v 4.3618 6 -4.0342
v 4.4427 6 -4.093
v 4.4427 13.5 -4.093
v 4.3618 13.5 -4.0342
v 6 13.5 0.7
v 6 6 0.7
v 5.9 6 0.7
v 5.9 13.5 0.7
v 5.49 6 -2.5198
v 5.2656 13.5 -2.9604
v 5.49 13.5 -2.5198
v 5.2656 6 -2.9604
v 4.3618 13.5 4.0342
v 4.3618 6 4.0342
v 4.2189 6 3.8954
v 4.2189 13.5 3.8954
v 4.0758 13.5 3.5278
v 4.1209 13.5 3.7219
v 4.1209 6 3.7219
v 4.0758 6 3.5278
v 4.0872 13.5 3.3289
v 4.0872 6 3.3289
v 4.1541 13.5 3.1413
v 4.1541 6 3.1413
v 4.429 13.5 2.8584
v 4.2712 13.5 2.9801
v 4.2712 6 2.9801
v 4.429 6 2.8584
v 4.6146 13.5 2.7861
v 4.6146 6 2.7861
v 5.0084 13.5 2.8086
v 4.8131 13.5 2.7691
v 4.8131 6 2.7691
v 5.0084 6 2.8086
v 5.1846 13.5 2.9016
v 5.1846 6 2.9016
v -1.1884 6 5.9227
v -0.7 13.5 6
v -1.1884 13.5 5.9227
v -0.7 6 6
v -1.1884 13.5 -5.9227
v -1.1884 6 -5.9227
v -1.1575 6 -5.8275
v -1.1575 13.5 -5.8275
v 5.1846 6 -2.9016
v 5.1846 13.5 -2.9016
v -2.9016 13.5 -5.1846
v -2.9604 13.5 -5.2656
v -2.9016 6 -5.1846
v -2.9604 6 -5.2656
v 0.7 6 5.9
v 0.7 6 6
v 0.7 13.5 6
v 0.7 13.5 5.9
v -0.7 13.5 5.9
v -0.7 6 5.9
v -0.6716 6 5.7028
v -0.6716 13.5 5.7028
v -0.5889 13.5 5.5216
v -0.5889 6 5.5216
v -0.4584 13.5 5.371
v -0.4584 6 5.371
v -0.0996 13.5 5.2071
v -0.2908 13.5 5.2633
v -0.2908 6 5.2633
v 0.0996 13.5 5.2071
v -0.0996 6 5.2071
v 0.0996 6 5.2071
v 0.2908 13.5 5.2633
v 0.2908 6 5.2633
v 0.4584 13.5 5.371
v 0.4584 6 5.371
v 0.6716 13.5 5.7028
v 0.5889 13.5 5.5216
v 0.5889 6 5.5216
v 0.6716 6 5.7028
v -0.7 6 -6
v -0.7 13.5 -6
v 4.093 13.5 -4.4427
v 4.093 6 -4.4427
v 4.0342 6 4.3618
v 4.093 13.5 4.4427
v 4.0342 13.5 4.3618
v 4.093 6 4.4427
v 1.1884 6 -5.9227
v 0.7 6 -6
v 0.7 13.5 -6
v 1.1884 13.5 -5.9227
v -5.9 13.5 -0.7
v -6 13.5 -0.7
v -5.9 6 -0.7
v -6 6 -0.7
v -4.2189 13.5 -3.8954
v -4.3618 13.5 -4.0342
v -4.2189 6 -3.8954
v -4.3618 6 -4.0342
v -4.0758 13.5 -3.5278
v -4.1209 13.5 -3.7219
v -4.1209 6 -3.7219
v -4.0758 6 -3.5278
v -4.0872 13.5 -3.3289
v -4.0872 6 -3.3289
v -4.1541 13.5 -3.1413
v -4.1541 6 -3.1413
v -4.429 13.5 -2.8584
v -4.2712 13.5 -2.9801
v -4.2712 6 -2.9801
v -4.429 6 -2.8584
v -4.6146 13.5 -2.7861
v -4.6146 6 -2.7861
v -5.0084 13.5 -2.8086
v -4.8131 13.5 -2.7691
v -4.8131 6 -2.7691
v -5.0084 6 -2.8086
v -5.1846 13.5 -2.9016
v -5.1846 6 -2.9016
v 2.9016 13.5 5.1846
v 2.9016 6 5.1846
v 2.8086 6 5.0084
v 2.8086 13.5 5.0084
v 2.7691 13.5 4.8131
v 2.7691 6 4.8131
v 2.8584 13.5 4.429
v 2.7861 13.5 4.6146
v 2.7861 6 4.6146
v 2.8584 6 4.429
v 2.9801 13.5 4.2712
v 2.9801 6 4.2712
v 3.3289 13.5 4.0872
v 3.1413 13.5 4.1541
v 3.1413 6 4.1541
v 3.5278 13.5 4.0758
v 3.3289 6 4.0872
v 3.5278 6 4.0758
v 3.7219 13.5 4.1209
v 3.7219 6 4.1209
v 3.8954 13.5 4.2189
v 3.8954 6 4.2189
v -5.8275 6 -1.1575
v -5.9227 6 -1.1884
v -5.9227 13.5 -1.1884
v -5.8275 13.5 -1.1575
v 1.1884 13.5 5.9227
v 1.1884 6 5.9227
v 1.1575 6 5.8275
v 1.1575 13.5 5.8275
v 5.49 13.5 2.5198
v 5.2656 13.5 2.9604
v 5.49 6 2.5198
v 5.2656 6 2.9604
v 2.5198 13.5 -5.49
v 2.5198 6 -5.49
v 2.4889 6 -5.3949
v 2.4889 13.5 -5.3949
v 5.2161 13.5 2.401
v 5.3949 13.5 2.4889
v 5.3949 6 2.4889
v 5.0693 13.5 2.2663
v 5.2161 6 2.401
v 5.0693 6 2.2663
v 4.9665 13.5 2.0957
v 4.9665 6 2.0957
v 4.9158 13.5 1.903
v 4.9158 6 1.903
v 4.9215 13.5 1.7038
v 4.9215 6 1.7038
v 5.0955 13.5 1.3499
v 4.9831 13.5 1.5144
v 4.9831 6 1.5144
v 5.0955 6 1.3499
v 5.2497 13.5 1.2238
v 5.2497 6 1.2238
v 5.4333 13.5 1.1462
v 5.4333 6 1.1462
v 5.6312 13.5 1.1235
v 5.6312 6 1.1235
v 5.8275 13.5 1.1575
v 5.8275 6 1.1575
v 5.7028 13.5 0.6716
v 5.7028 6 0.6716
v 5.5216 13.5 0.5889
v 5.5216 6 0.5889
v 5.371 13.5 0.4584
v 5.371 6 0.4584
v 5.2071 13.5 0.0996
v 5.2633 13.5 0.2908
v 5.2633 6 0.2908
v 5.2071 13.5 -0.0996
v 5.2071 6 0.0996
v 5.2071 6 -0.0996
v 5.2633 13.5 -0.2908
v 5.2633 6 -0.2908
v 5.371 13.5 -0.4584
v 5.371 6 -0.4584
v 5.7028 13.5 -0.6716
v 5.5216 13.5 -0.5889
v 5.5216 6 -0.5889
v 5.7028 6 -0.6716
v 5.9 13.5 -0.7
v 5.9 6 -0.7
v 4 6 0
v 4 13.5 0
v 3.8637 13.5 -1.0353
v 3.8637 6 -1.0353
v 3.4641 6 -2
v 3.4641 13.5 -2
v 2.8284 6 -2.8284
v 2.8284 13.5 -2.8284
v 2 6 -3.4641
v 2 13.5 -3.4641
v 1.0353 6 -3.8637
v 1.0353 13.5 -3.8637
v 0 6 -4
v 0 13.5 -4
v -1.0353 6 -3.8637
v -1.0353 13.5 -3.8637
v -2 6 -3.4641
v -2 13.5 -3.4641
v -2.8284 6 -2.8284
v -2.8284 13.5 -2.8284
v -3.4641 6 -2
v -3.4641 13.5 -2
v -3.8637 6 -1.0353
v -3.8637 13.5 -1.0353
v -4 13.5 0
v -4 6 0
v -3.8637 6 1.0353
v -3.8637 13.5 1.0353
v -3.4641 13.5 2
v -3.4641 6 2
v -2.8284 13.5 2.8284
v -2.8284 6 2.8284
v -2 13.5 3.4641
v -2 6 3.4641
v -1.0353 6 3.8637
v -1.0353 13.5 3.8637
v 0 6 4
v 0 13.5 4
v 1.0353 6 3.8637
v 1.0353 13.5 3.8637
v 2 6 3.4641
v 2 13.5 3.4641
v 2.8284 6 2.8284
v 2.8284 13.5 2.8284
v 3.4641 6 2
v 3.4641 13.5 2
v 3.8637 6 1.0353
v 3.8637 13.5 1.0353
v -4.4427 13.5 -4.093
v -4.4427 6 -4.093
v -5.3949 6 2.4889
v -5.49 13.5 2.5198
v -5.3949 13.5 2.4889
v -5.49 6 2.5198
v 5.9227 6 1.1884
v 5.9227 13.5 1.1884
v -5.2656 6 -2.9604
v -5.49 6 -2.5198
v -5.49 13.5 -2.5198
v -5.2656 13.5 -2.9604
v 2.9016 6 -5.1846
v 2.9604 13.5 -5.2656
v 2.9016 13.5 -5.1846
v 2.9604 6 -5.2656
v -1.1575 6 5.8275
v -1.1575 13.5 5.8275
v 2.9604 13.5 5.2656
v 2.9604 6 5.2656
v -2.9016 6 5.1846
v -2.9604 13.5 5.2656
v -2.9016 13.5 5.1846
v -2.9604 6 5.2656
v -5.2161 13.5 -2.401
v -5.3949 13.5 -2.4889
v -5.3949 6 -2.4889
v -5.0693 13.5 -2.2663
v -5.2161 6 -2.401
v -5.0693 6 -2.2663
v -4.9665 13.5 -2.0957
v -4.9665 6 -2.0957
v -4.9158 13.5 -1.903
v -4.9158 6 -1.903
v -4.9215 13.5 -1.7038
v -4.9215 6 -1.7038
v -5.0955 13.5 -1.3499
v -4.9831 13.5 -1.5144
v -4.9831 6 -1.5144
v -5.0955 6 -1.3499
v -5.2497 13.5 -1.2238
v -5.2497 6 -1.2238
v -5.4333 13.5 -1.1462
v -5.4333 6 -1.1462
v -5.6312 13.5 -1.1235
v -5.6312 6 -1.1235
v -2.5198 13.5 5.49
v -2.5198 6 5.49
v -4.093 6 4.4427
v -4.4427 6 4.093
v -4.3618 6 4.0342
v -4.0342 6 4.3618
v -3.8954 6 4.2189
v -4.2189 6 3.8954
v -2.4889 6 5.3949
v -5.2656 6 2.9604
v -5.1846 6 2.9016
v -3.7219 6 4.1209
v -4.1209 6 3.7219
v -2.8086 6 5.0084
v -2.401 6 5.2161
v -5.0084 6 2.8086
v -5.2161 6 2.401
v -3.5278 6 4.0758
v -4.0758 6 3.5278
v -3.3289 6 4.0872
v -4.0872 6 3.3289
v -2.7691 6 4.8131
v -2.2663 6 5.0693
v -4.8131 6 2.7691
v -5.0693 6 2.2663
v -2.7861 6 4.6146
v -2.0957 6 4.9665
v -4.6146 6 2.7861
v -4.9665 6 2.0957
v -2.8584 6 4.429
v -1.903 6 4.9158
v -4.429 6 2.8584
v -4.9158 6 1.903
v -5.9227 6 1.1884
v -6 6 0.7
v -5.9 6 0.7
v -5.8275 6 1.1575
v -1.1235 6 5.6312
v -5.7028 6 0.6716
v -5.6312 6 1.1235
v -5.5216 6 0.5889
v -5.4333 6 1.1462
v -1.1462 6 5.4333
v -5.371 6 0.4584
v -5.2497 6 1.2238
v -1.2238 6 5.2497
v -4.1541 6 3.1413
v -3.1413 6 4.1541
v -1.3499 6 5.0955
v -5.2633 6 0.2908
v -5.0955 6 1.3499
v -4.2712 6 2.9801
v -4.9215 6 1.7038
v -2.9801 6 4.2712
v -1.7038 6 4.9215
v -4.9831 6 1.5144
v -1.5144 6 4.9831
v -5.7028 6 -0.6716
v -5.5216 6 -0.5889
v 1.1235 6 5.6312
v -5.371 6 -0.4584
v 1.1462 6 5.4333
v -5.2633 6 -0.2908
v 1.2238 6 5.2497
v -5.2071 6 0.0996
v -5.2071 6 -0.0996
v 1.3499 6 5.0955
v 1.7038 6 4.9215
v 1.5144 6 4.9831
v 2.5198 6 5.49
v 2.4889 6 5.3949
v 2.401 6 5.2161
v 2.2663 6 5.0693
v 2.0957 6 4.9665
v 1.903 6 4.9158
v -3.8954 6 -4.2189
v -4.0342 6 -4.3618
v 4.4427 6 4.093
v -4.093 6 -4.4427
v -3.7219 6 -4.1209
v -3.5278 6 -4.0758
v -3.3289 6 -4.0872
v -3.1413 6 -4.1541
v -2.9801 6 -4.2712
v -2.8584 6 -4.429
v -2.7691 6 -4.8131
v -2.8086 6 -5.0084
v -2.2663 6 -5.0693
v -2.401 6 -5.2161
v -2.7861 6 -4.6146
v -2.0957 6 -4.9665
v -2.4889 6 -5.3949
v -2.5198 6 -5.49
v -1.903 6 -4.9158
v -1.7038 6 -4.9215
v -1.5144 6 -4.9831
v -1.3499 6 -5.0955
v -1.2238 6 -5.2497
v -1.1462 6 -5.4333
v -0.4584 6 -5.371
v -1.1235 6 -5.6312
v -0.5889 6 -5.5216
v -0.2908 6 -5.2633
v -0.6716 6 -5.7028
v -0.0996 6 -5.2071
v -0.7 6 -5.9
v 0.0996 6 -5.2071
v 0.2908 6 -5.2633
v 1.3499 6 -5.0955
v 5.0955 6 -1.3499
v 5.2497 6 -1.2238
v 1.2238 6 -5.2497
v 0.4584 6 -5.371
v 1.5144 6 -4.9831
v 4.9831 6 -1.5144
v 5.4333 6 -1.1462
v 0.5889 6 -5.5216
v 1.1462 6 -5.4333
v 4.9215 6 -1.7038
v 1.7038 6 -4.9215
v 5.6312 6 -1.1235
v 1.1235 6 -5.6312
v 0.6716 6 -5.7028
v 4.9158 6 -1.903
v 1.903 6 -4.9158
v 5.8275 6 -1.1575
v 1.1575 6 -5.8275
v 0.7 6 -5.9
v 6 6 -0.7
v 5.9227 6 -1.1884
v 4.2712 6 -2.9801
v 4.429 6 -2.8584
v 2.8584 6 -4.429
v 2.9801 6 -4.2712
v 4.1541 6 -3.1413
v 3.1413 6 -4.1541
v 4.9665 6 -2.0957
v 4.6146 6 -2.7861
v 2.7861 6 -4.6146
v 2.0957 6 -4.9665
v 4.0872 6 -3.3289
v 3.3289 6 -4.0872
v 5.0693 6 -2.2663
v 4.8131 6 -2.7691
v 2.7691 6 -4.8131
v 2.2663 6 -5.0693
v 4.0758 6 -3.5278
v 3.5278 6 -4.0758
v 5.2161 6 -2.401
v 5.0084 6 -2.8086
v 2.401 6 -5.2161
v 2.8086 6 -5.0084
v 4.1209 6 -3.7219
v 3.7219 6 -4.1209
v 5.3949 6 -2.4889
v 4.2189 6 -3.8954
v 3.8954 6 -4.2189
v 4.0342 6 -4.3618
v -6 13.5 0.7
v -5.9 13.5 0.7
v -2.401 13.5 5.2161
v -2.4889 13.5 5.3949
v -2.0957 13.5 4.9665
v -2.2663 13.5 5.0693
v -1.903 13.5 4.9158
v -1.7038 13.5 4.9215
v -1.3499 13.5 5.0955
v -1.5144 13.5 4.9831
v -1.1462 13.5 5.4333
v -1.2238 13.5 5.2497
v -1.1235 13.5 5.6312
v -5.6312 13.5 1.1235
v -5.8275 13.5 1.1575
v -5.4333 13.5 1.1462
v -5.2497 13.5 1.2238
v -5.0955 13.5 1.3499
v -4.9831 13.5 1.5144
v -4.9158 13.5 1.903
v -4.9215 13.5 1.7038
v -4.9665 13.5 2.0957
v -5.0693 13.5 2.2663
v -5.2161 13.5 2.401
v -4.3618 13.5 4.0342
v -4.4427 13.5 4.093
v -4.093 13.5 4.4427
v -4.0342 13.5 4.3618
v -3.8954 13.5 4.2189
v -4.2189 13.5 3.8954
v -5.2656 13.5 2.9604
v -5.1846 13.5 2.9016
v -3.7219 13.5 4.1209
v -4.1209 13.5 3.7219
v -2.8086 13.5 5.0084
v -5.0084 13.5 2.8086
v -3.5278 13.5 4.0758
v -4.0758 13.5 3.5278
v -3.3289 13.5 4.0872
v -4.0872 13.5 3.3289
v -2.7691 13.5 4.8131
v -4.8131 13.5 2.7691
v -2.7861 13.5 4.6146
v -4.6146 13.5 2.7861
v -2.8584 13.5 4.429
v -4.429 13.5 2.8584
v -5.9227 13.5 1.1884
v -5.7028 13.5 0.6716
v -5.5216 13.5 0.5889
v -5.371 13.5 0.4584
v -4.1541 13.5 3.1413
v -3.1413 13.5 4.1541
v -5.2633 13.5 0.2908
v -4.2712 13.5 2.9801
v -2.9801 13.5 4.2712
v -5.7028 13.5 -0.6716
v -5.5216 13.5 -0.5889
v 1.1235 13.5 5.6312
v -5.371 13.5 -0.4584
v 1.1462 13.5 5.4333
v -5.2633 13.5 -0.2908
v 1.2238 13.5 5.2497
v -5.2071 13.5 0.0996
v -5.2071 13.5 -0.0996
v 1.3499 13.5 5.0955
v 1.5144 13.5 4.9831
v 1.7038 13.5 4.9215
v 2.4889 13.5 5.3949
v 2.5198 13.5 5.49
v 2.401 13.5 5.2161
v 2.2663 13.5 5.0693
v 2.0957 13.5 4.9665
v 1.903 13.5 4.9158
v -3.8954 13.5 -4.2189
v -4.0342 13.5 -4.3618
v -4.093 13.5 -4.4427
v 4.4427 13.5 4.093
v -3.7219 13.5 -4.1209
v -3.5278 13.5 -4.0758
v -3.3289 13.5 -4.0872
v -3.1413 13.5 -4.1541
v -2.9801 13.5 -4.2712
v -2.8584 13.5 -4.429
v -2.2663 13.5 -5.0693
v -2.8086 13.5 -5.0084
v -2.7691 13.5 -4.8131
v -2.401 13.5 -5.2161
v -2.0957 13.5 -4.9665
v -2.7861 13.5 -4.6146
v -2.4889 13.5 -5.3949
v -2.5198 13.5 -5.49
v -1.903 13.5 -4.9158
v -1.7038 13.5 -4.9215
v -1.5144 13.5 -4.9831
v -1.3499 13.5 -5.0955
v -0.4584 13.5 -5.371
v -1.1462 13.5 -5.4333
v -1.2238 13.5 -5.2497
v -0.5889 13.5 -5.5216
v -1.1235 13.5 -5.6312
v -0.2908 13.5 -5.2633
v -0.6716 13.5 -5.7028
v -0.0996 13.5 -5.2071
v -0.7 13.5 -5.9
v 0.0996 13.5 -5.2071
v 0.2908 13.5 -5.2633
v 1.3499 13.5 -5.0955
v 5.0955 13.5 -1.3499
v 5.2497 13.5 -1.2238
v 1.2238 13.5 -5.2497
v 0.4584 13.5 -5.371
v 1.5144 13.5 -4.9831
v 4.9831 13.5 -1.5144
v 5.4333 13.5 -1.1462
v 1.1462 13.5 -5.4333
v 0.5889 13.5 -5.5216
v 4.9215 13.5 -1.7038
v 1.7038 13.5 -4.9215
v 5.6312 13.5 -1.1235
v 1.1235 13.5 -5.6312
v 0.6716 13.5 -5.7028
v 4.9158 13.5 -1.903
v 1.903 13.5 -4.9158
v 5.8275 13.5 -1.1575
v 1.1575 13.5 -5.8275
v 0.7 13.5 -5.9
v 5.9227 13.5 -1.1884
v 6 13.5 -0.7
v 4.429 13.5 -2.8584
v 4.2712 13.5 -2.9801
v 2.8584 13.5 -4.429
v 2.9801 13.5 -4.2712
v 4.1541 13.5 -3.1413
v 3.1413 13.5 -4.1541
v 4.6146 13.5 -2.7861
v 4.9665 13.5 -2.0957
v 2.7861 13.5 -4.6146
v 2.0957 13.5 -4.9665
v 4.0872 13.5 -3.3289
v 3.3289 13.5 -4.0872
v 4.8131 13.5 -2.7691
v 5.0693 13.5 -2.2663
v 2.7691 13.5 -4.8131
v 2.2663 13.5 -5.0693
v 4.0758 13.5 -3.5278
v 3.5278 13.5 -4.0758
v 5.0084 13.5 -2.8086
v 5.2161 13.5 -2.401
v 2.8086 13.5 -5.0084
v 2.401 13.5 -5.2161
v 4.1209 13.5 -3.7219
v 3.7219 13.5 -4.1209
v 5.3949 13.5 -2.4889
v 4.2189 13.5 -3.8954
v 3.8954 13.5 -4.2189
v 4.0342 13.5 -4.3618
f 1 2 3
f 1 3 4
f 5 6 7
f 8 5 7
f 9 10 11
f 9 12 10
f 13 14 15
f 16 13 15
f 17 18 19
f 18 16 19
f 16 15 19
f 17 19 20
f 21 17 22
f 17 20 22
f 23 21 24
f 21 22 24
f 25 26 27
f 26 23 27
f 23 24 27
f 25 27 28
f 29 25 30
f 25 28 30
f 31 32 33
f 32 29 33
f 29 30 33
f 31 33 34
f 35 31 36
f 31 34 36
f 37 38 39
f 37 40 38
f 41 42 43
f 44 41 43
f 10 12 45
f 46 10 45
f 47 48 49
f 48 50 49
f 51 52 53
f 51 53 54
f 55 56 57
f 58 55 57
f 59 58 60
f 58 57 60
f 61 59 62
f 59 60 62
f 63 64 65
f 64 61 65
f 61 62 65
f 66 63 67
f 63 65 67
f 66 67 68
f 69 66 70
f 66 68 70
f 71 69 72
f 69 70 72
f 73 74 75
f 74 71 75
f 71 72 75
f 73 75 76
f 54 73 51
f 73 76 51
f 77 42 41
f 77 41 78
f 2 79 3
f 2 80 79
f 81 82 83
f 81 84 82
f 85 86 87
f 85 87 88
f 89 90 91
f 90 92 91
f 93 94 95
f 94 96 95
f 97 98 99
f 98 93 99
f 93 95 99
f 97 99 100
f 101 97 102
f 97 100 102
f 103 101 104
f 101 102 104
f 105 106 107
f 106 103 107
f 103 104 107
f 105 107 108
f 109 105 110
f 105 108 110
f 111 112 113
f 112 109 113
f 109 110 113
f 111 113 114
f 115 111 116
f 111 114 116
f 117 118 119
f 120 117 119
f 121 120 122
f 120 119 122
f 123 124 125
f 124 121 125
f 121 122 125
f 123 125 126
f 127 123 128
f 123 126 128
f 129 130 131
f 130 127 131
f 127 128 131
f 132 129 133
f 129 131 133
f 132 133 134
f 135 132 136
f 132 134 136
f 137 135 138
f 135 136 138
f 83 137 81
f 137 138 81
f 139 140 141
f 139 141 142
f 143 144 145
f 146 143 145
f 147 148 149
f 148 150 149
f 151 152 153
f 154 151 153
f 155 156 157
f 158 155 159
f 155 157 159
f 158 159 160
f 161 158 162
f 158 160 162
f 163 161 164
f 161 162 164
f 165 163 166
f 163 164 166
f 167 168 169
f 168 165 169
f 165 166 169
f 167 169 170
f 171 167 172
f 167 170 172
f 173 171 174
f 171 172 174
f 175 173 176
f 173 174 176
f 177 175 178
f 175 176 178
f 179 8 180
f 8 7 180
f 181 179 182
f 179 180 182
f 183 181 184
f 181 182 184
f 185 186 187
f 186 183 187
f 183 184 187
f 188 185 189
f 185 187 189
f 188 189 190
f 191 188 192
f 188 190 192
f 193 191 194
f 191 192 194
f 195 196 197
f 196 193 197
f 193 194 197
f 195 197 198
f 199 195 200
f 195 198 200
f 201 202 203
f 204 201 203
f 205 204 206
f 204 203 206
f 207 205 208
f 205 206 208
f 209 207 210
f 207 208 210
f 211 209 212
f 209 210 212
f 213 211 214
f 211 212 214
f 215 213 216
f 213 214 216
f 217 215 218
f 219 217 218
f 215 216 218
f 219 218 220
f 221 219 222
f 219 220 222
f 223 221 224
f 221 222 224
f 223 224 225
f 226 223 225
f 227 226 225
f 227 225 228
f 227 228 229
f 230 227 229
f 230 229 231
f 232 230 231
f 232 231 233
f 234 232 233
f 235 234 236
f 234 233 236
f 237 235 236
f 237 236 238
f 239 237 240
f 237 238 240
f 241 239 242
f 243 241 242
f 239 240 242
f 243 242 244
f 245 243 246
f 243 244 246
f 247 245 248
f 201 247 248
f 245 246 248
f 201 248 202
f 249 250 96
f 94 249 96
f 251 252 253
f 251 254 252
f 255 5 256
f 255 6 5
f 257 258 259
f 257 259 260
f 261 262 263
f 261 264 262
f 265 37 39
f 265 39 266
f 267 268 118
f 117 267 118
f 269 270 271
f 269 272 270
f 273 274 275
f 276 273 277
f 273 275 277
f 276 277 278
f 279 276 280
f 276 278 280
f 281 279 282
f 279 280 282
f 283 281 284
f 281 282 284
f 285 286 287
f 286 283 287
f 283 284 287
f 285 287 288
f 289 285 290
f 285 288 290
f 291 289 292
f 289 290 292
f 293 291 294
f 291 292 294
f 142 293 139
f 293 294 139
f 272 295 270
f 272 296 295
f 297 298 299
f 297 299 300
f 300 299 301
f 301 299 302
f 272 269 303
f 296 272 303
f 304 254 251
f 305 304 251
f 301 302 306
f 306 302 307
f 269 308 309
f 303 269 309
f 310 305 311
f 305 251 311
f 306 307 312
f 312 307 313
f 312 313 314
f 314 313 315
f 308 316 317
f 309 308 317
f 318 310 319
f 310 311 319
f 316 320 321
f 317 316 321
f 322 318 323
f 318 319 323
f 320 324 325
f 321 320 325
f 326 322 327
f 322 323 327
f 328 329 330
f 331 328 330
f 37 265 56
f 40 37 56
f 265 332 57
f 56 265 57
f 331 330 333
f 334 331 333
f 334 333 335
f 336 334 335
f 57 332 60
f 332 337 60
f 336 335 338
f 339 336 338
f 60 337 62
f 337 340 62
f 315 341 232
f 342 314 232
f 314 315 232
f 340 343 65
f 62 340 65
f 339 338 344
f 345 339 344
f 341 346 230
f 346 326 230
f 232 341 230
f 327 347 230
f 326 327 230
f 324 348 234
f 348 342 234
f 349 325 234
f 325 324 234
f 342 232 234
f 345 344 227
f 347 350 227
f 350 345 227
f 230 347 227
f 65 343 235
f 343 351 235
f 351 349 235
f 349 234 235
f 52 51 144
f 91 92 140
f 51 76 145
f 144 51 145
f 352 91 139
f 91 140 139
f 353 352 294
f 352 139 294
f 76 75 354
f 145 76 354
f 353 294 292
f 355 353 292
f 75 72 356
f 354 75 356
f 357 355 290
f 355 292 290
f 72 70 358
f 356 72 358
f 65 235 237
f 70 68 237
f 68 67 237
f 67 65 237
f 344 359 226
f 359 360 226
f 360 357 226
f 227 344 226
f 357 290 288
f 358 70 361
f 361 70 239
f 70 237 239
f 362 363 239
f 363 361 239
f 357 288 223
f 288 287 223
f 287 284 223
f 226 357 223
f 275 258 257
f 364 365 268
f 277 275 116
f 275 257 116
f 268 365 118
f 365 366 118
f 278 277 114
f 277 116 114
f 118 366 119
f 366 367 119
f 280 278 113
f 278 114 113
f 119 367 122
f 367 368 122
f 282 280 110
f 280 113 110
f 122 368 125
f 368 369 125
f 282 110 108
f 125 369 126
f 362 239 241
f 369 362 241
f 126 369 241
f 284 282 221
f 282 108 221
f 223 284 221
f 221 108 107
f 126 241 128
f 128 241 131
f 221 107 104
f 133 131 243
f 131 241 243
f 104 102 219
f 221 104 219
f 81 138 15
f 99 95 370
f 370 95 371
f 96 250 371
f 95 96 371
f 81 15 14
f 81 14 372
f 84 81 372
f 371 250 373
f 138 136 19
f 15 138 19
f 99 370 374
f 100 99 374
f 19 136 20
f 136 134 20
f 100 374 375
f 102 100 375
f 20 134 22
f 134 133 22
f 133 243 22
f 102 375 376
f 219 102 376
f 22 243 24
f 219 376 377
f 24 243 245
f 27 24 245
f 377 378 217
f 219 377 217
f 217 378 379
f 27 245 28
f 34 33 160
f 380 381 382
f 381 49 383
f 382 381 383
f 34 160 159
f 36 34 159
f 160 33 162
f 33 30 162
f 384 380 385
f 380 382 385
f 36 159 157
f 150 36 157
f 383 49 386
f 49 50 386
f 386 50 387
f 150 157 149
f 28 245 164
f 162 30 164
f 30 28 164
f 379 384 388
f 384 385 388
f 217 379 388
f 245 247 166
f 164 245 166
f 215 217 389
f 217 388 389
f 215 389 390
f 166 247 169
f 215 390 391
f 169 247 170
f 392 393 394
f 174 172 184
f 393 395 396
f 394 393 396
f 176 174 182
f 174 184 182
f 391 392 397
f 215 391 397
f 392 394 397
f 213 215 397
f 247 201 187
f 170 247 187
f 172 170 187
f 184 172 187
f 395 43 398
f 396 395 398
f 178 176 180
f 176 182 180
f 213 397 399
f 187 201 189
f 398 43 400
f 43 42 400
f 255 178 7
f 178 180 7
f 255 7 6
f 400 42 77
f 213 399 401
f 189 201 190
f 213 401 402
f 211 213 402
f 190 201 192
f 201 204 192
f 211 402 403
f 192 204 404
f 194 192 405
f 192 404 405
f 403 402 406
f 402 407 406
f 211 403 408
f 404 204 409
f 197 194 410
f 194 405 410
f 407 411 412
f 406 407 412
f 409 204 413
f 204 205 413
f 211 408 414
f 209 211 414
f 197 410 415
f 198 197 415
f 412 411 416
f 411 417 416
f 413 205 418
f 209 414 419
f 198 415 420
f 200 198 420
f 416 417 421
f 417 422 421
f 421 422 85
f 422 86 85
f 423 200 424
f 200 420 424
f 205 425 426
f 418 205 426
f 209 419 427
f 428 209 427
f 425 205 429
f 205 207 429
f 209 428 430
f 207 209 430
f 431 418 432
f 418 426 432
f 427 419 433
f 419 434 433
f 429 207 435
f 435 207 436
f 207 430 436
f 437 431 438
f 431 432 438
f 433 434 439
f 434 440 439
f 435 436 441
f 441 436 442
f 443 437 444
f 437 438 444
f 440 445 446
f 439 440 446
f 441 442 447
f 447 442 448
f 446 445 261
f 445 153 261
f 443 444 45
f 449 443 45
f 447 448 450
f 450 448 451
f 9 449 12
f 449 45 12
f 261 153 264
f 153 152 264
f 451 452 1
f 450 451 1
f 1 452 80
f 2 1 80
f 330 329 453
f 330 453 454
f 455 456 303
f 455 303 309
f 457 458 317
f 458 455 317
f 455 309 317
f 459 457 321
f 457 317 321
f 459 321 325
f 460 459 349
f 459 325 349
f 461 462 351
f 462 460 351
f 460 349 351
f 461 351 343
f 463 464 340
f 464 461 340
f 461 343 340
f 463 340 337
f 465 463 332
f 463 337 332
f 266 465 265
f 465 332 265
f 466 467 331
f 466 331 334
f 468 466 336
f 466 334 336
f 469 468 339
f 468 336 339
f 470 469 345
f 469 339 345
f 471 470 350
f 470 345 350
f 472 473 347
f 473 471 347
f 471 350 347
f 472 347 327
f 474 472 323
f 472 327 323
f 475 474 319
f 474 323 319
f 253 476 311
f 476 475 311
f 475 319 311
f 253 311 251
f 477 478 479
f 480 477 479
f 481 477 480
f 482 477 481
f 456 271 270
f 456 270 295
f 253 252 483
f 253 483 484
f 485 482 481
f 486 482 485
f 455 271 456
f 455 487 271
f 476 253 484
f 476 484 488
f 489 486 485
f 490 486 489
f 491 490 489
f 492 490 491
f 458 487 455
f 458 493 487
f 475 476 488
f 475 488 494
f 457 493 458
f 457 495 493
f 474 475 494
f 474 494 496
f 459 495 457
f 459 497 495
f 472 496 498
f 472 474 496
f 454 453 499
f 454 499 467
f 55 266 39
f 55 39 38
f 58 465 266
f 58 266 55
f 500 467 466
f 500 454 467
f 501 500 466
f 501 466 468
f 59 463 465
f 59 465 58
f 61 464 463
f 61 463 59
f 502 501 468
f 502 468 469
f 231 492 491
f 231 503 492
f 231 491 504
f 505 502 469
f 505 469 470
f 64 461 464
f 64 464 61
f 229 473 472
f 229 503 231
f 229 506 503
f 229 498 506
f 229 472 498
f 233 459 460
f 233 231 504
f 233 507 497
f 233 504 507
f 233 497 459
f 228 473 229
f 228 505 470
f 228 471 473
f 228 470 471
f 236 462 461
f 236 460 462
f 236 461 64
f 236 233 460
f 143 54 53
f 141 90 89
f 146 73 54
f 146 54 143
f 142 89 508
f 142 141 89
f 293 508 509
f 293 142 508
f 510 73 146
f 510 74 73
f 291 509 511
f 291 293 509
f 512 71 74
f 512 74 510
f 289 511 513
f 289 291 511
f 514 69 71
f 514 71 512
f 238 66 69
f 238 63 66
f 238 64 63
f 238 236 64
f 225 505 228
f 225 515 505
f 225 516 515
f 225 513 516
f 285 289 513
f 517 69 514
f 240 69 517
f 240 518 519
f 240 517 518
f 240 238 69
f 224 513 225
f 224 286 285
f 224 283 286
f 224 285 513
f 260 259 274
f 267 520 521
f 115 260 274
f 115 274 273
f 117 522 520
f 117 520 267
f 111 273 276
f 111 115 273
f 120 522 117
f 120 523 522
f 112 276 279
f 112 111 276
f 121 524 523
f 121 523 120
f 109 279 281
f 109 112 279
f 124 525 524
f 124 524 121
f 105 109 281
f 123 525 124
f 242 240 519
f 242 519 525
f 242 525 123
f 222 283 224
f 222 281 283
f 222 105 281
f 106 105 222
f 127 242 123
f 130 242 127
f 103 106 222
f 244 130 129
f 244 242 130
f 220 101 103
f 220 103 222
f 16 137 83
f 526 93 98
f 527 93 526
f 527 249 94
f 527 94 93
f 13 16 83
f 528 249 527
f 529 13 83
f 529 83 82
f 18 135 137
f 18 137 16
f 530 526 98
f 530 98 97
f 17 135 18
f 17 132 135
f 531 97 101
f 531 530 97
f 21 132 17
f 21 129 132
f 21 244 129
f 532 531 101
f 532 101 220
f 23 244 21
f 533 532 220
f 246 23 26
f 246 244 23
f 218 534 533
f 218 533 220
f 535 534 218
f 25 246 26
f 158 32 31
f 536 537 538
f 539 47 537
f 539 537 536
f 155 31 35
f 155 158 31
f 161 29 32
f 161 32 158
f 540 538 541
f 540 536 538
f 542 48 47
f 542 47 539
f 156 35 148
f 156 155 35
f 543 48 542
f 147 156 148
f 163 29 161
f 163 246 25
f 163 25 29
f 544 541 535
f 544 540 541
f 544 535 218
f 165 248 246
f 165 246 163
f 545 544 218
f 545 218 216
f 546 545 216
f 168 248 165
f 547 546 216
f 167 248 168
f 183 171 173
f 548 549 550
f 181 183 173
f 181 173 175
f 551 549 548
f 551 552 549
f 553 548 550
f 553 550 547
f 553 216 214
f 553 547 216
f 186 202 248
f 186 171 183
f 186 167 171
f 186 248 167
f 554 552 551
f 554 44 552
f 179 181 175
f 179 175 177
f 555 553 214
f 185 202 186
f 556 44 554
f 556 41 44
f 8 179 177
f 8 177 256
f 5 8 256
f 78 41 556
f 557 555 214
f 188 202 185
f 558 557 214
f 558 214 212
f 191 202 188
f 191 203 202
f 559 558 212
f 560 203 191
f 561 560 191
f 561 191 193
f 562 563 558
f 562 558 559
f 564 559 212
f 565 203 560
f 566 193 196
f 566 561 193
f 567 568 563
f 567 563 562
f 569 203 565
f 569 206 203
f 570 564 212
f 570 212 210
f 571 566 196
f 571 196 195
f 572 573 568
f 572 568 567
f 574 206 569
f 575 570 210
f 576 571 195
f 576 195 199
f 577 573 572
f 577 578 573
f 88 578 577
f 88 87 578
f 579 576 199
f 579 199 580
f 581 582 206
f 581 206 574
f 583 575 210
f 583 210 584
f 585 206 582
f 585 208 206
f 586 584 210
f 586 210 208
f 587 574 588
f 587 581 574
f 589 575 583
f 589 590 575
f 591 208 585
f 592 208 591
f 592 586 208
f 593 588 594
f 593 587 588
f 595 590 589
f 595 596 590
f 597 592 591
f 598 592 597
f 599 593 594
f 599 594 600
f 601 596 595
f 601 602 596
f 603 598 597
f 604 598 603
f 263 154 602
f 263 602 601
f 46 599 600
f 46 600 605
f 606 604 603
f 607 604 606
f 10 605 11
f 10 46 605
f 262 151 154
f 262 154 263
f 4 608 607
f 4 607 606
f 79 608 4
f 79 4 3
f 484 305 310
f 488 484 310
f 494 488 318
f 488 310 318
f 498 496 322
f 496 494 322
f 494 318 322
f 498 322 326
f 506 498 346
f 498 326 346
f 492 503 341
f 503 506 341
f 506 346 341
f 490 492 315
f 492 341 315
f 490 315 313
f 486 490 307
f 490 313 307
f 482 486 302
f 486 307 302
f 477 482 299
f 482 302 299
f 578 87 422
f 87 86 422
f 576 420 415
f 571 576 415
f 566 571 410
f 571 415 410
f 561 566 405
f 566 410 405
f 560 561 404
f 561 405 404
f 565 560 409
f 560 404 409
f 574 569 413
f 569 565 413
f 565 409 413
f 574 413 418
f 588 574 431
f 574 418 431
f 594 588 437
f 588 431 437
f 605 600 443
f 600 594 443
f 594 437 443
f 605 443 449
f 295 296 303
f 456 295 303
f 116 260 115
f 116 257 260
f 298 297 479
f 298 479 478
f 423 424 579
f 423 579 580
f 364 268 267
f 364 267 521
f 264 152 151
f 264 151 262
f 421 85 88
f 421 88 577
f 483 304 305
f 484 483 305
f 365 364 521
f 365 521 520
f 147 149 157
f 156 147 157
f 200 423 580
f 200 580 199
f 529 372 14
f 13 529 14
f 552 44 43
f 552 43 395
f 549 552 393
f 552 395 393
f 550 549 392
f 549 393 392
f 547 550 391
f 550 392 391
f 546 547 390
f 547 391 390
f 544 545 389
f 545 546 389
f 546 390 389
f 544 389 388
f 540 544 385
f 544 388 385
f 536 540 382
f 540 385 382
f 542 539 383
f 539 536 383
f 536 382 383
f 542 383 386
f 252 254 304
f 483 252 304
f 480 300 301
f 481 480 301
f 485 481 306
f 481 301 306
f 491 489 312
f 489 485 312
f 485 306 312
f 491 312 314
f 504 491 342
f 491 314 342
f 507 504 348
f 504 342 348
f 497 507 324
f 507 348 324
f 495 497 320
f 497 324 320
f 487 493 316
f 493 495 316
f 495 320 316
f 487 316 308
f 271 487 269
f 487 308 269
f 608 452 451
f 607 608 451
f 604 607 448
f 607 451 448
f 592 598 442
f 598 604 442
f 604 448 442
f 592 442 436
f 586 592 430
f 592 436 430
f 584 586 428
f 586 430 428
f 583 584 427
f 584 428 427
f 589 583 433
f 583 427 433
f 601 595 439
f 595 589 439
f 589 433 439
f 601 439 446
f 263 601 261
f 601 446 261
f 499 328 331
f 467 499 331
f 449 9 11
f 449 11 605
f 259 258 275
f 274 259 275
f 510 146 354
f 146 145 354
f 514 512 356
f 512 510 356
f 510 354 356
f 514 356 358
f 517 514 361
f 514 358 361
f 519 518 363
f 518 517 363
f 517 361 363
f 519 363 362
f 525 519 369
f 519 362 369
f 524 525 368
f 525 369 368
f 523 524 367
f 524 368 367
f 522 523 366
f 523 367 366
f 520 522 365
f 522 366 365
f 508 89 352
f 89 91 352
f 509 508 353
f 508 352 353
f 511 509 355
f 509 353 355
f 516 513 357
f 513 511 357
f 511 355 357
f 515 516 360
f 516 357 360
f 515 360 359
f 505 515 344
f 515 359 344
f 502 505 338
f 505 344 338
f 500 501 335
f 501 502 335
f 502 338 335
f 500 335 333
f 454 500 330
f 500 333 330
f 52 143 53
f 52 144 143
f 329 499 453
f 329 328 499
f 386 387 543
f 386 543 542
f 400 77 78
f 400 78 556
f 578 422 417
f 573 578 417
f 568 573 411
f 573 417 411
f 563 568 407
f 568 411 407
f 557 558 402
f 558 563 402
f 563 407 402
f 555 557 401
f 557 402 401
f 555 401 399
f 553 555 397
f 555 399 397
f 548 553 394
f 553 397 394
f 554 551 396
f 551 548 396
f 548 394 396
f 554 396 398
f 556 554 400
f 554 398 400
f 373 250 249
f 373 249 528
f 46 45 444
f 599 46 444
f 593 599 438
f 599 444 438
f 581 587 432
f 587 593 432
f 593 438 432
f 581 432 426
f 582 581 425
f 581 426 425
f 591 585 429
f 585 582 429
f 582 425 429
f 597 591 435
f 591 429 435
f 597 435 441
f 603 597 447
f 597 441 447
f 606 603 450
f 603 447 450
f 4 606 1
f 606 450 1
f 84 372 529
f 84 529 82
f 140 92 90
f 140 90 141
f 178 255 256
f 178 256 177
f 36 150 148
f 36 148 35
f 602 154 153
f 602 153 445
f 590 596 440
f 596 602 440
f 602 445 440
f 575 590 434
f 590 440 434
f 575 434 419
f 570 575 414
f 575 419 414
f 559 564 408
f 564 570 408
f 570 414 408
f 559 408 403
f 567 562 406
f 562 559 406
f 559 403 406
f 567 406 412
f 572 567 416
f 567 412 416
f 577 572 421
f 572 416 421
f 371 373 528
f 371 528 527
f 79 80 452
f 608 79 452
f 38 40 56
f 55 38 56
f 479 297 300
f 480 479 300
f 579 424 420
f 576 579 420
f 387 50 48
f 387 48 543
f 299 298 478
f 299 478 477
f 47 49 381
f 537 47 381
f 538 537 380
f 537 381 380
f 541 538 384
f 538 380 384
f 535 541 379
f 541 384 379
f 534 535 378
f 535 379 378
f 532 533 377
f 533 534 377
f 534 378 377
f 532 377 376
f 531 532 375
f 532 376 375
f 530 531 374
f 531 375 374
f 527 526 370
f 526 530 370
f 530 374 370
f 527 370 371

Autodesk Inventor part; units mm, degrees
ref_plane "YZ Plane" through (0, 0, 0) normal (1, 0, 0) x (0, 1, 0)
ref_plane "XZ Plane" through (0, 0, 0) normal (0, 1, 0) x (-1, 0, 0)
ref_plane "Work Plane7" through (0, 6, 0) normal (0, 1, 0) x (1, 0, 0)
sketch "Sketch2" plane through (0, 6, 0) normal (0, 1, 0) x (1, 0, 0)
  line L0 (0.7, 6) -> (0.7, 5.9)
  line L1 (-0.7, 6) -> (-0.7, 5.9)
  arc A0 (-0.7, 5.9) -> (0.7, 5.9) centre (0, 5.9) ccw
  line L2 (-1.1884, 5.9227) -> (-1.1575, 5.8275)
  line L3 (-2.5198, 5.49) -> (-2.4889, 5.3949)
  arc A1 (-2.4889, 5.3949) -> (-1.1575, 5.8275) centre (-1.8232, 5.6112) ccw
  line L4 (-2.9604, 5.2656) -> (-2.9016, 5.1846)
  line L5 (-4.093, 4.4427) -> (-4.0342, 4.3618)
  arc A2 (-4.0342, 4.3618) -> (-2.9016, 5.1846) centre (-3.4679, 4.7732) ccw
  line L6 (-4.4427, 4.093) -> (-4.3618, 4.0342)
  line L7 (-5.2656, 2.9604) -> (-5.1846, 2.9016)
  arc A3 (-5.1846, 2.9016) -> (-4.3618, 4.0342) centre (-4.7732, 3.4679) ccw
  line L8 (-5.49, 2.5198) -> (-5.3949, 2.4889)
  line L9 (-5.9227, 1.1884) -> (-5.8275, 1.1575)
  arc A4 (-5.8275, 1.1575) -> (-5.3949, 2.4889) centre (-5.6112, 1.8232) ccw
  line L10 (-6, 0.7) -> (-5.9, 0.7)
  line L11 (-6, -0.7) -> (-5.9, -0.7)
  arc A5 (-5.9, -0.7) -> (-5.9, 0.7) centre (-5.9, 0) ccw
  line L12 (-5.9227, -1.1884) -> (-5.8275, -1.1575)
  line L13 (-5.49, -2.5198) -> (-5.3949, -2.4889)
  arc A6 (-5.3949, -2.4889) -> (-5.8275, -1.1575) centre (-5.6112, -1.8232) ccw
  line L14 (-5.2656, -2.9604) -> (-5.1846, -2.9016)
  line L15 (-4.4427, -4.093) -> (-4.3618, -4.0342)
  arc A7 (-4.3618, -4.0342) -> (-5.1846, -2.9016) centre (-4.7732, -3.4679) ccw
  line L16 (-4.093, -4.4427) -> (-4.0342, -4.3618)
  line L17 (-2.9604, -5.2656) -> (-2.9016, -5.1846)
  arc A8 (-2.9016, -5.1846) -> (-4.0342, -4.3618) centre (-3.4679, -4.7732) ccw
  line L18 (-2.5198, -5.49) -> (-2.4889, -5.3949)
  line L19 (-1.1884, -5.9227) -> (-1.1575, -5.8275)
  arc A9 (-1.1575, -5.8275) -> (-2.4889, -5.3949) centre (-1.8232, -5.6112) ccw
  line L20 (-0.7, -6) -> (-0.7, -5.9)
  line L21 (0.7, -6) -> (0.7, -5.9)
  arc A10 (0.7, -5.9) -> (-0.7, -5.9) centre (0, -5.9) ccw
  line L22 (1.1884, -5.9227) -> (1.1575, -5.8275)
  line L23 (2.5198, -5.49) -> (2.4889, -5.3949)
  arc A11 (2.4889, -5.3949) -> (1.1575, -5.8275) centre (1.8232, -5.6112) ccw
  line L24 (2.9604, -5.2656) -> (2.9016, -5.1846)
  line L25 (4.093, -4.4427) -> (4.0342, -4.3618)
  arc A12 (4.0342, -4.3618) -> (2.9016, -5.1846) centre (3.4679, -4.7732) ccw
  line L26 (4.4427, -4.093) -> (4.3618, -4.0342)
  line L27 (5.2656, -2.9604) -> (5.1846, -2.9016)
  arc A13 (5.1846, -2.9016) -> (4.3618, -4.0342) centre (4.7732, -3.4679) ccw
  line L28 (5.49, -2.5198) -> (5.3949, -2.4889)
  line L29 (5.9227, -1.1884) -> (5.8275, -1.1575)
  arc A14 (5.8275, -1.1575) -> (5.3949, -2.4889) centre (5.6112, -1.8232) ccw
  line L30 (6, -0.7) -> (5.9, -0.7)
  line L31 (6, 0.7) -> (5.9, 0.7)
  arc A15 (5.9, 0.7) -> (5.9, -0.7) centre (5.9, 0) ccw
  line L32 (5.9227, 1.1884) -> (5.8275, 1.1575)
  line L33 (5.49, 2.5198) -> (5.3949, 2.4889)
  arc A16 (5.3949, 2.4889) -> (5.8275, 1.1575) centre (5.6112, 1.8232) ccw
  line L34 (5.2656, 2.9604) -> (5.1846, 2.9016)
  line L35 (4.4427, 4.093) -> (4.3618, 4.0342)
  arc A17 (4.3618, 4.0342) -> (5.1846, 2.9016) centre (4.7732, 3.4679) ccw
  line L36 (4.093, 4.4427) -> (4.0342, 4.3618)
  line L37 (2.9604, 5.2656) -> (2.9016, 5.1846)
  arc A18 (2.9016, 5.1846) -> (4.0342, 4.3618) centre (3.4679, 4.7732) ccw
  line L38 (2.5198, 5.49) -> (2.4889, 5.3949)
  line L39 (1.1884, 5.9227) -> (1.1575, 5.8275)
  arc A19 (1.1575, 5.8275) -> (2.4889, 5.3949) centre (1.8232, 5.6112) ccw
  line L40 (-2.9604, 5.2656) -> (-2.5198, 5.49)
  line L41 (-1.1884, 5.9227) -> (-0.7, 6)
  line L42 (0.7, 6) -> (1.1884, 5.9227)
  line L43 (2.5198, 5.49) -> (2.9604, 5.2656)
  line L44 (4.093, 4.4427) -> (4.4427, 4.093)
  line L45 (5.2656, 2.9604) -> (5.49, 2.5198)
  line L46 (5.9227, 1.1884) -> (6, 0.7)
  line L47 (6, -0.7) -> (5.9227, -1.1884)
  line L48 (5.2656, -2.9604) -> (5.49, -2.5198)
  line L49 (4.4427, -4.093) -> (4.093, -4.4427)
  line L50 (2.9604, -5.2656) -> (2.5198, -5.49)
  line L51 (1.1884, -5.9227) -> (0.7, -6)
  line L52 (-0.7, -6) -> (-1.1884, -5.9227)
  line L53 (-2.5198, -5.49) -> (-2.9604, -5.2656)
  line L54 (-4.093, -4.4427) -> (-4.4427, -4.093)
  line L55 (-5.49, -2.5198) -> (-5.2656, -2.9604)
  line L56 (-5.9227, -1.1884) -> (-6, -0.7)
  line L57 (-6, 0.7) -> (-5.9227, 1.1884)
  line L58 (-5.49, 2.5198) -> (-5.2656, 2.9604)
  line L59 (-4.4427, 4.093) -> (-4.093, 4.4427)
  point P0 (0, 0)
  point P1 (-5.9, 0)
  dimension "d15" = 0.1
  dimension "d16" = 0.7
  dimension "d17" = 0.1
  dimension "d24" = 360
  dimension "d60" = 5.9
  dimension "d61" = 81
extrude "Extrusion9" add sketch "Sketch2" along normal blind 7.5
sketch "Sketch11" plane through (0, 13.5, 0) normal (0, 1, 0) x (1, 0, 0)
  circle A0 centre (0, 0) radius 4
  dimension "d64" = 8
extrude "Extrusion10" cut sketch "Sketch11" against normal up to next
properties part number "PulleyGT2x20Top" material "Aluminum 6061"
